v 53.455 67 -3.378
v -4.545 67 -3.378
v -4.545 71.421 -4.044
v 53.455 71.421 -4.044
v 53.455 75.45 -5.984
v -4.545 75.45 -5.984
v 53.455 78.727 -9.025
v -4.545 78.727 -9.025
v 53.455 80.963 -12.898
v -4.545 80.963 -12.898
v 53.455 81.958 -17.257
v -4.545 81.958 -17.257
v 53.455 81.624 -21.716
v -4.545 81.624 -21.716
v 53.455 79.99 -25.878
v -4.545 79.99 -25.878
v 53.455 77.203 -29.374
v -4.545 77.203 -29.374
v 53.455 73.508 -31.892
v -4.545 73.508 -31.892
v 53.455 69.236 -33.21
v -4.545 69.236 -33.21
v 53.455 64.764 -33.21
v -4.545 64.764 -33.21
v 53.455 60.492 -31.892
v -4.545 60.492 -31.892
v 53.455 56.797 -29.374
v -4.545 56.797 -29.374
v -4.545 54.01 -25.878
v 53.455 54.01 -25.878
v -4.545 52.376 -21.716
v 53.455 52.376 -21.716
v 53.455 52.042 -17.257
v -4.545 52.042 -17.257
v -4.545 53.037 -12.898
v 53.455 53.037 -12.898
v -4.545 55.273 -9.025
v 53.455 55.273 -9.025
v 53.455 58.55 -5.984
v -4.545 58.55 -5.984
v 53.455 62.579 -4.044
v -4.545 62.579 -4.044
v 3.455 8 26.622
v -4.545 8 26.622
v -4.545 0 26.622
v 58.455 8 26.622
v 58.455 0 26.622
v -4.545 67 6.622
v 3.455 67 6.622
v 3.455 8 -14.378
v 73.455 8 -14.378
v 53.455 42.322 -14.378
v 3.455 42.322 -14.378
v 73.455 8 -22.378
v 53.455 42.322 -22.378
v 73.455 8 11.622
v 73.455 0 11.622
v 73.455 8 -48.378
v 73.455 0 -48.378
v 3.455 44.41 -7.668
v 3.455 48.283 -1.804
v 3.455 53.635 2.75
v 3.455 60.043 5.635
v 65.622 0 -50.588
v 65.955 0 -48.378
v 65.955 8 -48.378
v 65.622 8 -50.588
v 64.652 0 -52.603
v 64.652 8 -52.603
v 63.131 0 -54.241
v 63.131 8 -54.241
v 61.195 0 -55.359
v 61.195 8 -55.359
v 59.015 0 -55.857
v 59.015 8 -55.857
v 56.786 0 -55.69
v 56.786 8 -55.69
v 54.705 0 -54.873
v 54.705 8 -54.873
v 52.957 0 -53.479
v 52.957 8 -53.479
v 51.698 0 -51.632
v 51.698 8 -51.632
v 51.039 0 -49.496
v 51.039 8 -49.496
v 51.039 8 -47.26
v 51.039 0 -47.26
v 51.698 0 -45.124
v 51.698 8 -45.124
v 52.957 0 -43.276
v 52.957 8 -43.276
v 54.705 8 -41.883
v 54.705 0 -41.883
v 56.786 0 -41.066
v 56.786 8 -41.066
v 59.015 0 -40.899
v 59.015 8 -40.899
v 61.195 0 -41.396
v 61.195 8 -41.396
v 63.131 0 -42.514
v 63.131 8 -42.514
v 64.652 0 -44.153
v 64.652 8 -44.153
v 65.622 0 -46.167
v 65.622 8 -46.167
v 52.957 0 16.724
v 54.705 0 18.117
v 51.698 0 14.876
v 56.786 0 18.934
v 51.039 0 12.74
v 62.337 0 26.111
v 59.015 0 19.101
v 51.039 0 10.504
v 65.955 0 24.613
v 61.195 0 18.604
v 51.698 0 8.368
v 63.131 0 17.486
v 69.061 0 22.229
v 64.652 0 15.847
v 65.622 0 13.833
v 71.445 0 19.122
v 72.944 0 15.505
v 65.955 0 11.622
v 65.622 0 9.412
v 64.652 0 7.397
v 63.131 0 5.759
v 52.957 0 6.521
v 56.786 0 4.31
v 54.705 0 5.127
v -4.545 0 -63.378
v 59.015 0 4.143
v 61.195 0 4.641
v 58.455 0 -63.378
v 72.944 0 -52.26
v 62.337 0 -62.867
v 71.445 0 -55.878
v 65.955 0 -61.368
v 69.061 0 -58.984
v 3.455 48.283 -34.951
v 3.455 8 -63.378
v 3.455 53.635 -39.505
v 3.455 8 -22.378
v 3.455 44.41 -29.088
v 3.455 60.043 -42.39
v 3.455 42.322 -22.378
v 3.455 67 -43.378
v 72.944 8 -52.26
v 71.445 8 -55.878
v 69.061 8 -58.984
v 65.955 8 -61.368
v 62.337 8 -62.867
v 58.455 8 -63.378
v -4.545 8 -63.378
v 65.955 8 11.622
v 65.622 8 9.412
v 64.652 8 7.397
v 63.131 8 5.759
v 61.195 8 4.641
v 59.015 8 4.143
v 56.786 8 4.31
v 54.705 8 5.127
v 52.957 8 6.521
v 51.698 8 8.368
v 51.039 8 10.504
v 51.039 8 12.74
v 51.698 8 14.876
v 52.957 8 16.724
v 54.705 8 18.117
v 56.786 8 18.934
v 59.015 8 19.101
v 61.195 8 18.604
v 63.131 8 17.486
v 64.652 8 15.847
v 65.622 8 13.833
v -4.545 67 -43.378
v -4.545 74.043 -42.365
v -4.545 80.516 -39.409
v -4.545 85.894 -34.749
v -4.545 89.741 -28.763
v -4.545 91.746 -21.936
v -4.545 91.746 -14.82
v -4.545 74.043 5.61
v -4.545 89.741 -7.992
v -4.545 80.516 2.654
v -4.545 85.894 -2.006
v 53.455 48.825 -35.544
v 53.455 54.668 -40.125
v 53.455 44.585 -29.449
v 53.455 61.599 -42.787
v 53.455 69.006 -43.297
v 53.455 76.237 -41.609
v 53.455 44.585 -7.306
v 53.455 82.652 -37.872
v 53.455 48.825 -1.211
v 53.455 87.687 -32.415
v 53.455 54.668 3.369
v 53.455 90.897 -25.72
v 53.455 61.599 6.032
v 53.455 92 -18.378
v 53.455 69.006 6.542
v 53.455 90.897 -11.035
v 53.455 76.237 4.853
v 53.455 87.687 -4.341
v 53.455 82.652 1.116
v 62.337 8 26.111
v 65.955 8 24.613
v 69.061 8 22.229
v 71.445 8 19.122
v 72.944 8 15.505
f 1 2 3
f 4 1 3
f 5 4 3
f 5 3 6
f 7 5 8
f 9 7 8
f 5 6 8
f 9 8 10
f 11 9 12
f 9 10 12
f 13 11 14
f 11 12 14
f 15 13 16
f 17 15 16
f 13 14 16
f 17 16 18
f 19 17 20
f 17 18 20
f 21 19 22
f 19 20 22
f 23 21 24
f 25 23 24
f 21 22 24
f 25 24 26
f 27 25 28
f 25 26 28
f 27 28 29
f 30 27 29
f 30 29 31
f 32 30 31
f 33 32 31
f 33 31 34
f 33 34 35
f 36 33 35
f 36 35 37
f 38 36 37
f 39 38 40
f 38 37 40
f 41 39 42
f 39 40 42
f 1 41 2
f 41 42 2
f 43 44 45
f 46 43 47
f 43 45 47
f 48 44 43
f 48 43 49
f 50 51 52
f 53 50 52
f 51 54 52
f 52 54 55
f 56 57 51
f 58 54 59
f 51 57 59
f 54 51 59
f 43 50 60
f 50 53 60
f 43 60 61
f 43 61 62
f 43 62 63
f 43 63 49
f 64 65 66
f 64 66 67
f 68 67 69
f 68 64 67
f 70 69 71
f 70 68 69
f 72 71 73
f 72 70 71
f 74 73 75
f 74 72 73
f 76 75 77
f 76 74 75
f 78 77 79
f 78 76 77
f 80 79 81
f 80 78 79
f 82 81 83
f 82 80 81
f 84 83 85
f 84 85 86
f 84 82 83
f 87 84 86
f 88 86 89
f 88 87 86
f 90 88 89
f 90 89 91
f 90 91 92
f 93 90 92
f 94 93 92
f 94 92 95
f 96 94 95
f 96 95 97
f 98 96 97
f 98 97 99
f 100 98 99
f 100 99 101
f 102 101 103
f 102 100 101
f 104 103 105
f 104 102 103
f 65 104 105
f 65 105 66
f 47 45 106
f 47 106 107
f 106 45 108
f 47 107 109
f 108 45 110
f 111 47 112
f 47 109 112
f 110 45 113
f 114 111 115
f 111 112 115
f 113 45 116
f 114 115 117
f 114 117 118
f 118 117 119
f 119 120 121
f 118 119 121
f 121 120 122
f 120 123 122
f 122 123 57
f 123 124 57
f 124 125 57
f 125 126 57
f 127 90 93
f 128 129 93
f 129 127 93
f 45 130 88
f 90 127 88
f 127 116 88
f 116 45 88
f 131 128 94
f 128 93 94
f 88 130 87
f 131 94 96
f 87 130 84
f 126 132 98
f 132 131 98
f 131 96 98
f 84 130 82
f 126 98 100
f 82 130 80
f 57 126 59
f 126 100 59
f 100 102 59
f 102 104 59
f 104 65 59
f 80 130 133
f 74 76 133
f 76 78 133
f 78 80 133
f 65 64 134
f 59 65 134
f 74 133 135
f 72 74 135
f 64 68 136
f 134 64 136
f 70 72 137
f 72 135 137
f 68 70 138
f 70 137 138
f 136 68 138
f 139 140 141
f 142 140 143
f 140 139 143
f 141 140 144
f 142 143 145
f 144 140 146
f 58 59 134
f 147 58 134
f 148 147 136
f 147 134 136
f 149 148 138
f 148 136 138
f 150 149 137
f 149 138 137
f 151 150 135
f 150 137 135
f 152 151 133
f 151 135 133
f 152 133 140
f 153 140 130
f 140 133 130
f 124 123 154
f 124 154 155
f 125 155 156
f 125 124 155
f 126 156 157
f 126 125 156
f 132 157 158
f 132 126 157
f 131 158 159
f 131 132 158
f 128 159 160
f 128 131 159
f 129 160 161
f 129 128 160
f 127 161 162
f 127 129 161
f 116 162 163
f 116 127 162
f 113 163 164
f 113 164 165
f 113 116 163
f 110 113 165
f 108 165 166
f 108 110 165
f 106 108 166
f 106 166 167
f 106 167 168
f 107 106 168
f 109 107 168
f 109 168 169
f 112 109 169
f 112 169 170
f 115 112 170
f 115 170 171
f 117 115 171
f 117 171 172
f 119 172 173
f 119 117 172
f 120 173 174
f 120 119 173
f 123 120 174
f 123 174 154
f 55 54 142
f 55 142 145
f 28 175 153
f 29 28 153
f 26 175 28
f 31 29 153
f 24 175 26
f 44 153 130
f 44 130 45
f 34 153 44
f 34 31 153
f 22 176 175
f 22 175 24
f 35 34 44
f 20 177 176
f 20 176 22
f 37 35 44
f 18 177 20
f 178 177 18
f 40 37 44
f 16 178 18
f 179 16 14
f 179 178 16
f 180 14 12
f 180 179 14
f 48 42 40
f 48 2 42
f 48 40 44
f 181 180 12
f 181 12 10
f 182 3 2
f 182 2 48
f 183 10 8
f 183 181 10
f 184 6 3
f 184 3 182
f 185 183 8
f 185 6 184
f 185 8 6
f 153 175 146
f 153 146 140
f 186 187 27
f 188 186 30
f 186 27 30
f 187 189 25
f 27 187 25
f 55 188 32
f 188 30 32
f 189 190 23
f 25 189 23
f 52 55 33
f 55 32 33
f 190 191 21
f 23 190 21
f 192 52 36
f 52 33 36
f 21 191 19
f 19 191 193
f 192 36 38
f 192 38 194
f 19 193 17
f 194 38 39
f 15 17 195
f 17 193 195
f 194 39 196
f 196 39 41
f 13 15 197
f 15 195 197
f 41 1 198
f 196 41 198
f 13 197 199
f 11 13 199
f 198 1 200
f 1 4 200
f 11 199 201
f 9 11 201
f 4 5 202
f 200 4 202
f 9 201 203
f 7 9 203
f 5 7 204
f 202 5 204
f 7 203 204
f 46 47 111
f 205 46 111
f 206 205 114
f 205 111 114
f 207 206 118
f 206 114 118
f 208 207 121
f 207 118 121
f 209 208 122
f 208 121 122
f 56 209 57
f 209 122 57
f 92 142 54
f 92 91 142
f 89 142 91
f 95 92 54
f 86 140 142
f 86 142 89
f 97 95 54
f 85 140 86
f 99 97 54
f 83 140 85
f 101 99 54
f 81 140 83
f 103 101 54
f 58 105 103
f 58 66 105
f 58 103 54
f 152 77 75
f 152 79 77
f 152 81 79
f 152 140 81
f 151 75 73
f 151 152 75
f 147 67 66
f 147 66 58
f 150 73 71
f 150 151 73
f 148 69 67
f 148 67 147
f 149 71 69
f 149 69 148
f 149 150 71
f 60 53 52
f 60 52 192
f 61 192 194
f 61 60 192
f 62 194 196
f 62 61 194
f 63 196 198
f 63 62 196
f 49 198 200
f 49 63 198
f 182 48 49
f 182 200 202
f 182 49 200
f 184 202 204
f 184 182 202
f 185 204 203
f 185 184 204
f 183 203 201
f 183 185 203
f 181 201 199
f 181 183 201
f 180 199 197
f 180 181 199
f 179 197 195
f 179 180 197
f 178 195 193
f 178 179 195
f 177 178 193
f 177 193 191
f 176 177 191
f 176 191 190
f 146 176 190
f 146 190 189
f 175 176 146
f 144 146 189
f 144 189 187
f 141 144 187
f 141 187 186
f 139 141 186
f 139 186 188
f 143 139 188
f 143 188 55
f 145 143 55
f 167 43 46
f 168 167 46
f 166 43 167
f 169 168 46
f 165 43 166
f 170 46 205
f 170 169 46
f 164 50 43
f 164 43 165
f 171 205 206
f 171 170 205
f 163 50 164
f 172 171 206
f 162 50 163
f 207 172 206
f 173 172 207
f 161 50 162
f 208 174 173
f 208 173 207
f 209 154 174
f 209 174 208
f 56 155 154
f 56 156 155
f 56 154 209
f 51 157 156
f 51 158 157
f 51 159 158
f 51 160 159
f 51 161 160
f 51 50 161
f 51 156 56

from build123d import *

# Parameters (mm, degrees)
SKETCH2_R           = 7.5
BOSS_EXTRUDE1_DEPTH = 8
BOSS_EXTRUDE3_DEPTH = 8
BOSS_EXTRUDE4_DEPTH = 58
SKETCH17_W          = 8
SKETCH17_H          = 39.501765498
BOSS_EXTRUDE6_DEPTH = 78
CUT_EXTRUDE1_DEPTH  = 78


with BuildPart() as part:
    # Sketch2 → Boss-Extrude1 (new body)
    with BuildSketch(Plane(origin=(0, 0, 0), x_dir=(1, 0, 0), z_dir=(0, 1, 0))):
        with BuildLine():
            Line((-4.545115865, -26.622255639), (58.454884135, -26.622255639))
            ThreePointArc((58.454884135, -26.622255639), (69.061485853, -22.228857357), (73.454884135, -11.622255639))
            Line((73.454884135, -11.622255639), (73.454884135, 48.377744361))
            ThreePointArc((73.454884135, 48.377744361), (69.061485853, 58.984346079), (58.454884135, 63.377744361))
            Line((58.454884135, 63.377744361), (-4.545115865, 63.377744361))
            Line((-4.545115865, 63.377744361), (-4.545115865, -26.622255639))
        make_face()
        with Locations((58.454884135, -11.622255639)):
            Circle(SKETCH2_R, mode=Mode.SUBTRACT)
        with Locations((58.454884135, 48.377744361)):
            Circle(SKETCH2_R, mode=Mode.SUBTRACT)
    extrude(amount=BOSS_EXTRUDE1_DEPTH)

    # Sketch3 → Boss-Extrude3 (add)
    with BuildSketch(Plane.ZY.offset(4.545115865)):
        with BuildLine():
            Line((-63.377744361, 8), (26.622255639, 8))
            Line((26.622255639, 8), (6.622255639, 67))
            ThreePointArc((6.622255639, 67), (-18.377744361, 42), (-43.377744361, 67))
            Line((-43.377744361, 67), (-63.377744361, 8))
        make_face()
    extrude(amount=-BOSS_EXTRUDE3_DEPTH)

    # Sketch3<4> → Boss-Extrude4 (add)
    with BuildSketch(Plane.ZY.offset(4.545115865)):
        with BuildLine():
            ThreePointArc((-43.377744361, 67), (-36.055413891, 49.32233047), (-18.377744361, 42))
            ThreePointArc((-18.377744361, 42), (-0.700074831, 49.32233047), (6.622255639, 67))
            ThreePointArc((6.622255639, 67), (-18.377744361, 92), (-43.377744361, 67))
        make_face()
        with BuildLine():
            ThreePointArc((-3.377744361, 67), (-7.771142643, 56.393398282), (-18.377744361, 52))
            ThreePointArc((-18.377744361, 52), (-28.984346079, 77.606601718), (-3.377744361, 67))
        make_face(mode=Mode.SUBTRACT)
    extrude(amount=-BOSS_EXTRUDE4_DEPTH)

    # Sketch17 → Boss-Extrude6 (add)
    with BuildSketch(Plane.ZY.offset(4.545115865)):
        with Locations((-18.377744361, 27.750882749)):
            Rectangle(SKETCH17_W, SKETCH17_H)
    extrude(amount=-BOSS_EXTRUDE6_DEPTH)

    # Sketch18 → Cut-Extrude1 (cut)
    with BuildSketch(Plane(origin=(0, 0, -22.377744361), x_dir=(-1, 0, 0), z_dir=(0, 0, -1))):
        Polygon((-73.454884135, 8), (-53.454884135, 42.322074641), (-53.454884135, 47.501765498), (-73.454884135, 47.501765498), align=None)
    extrude(amount=-CUT_EXTRUDE1_DEPTH, mode=Mode.SUBTRACT)


solid = part.part
